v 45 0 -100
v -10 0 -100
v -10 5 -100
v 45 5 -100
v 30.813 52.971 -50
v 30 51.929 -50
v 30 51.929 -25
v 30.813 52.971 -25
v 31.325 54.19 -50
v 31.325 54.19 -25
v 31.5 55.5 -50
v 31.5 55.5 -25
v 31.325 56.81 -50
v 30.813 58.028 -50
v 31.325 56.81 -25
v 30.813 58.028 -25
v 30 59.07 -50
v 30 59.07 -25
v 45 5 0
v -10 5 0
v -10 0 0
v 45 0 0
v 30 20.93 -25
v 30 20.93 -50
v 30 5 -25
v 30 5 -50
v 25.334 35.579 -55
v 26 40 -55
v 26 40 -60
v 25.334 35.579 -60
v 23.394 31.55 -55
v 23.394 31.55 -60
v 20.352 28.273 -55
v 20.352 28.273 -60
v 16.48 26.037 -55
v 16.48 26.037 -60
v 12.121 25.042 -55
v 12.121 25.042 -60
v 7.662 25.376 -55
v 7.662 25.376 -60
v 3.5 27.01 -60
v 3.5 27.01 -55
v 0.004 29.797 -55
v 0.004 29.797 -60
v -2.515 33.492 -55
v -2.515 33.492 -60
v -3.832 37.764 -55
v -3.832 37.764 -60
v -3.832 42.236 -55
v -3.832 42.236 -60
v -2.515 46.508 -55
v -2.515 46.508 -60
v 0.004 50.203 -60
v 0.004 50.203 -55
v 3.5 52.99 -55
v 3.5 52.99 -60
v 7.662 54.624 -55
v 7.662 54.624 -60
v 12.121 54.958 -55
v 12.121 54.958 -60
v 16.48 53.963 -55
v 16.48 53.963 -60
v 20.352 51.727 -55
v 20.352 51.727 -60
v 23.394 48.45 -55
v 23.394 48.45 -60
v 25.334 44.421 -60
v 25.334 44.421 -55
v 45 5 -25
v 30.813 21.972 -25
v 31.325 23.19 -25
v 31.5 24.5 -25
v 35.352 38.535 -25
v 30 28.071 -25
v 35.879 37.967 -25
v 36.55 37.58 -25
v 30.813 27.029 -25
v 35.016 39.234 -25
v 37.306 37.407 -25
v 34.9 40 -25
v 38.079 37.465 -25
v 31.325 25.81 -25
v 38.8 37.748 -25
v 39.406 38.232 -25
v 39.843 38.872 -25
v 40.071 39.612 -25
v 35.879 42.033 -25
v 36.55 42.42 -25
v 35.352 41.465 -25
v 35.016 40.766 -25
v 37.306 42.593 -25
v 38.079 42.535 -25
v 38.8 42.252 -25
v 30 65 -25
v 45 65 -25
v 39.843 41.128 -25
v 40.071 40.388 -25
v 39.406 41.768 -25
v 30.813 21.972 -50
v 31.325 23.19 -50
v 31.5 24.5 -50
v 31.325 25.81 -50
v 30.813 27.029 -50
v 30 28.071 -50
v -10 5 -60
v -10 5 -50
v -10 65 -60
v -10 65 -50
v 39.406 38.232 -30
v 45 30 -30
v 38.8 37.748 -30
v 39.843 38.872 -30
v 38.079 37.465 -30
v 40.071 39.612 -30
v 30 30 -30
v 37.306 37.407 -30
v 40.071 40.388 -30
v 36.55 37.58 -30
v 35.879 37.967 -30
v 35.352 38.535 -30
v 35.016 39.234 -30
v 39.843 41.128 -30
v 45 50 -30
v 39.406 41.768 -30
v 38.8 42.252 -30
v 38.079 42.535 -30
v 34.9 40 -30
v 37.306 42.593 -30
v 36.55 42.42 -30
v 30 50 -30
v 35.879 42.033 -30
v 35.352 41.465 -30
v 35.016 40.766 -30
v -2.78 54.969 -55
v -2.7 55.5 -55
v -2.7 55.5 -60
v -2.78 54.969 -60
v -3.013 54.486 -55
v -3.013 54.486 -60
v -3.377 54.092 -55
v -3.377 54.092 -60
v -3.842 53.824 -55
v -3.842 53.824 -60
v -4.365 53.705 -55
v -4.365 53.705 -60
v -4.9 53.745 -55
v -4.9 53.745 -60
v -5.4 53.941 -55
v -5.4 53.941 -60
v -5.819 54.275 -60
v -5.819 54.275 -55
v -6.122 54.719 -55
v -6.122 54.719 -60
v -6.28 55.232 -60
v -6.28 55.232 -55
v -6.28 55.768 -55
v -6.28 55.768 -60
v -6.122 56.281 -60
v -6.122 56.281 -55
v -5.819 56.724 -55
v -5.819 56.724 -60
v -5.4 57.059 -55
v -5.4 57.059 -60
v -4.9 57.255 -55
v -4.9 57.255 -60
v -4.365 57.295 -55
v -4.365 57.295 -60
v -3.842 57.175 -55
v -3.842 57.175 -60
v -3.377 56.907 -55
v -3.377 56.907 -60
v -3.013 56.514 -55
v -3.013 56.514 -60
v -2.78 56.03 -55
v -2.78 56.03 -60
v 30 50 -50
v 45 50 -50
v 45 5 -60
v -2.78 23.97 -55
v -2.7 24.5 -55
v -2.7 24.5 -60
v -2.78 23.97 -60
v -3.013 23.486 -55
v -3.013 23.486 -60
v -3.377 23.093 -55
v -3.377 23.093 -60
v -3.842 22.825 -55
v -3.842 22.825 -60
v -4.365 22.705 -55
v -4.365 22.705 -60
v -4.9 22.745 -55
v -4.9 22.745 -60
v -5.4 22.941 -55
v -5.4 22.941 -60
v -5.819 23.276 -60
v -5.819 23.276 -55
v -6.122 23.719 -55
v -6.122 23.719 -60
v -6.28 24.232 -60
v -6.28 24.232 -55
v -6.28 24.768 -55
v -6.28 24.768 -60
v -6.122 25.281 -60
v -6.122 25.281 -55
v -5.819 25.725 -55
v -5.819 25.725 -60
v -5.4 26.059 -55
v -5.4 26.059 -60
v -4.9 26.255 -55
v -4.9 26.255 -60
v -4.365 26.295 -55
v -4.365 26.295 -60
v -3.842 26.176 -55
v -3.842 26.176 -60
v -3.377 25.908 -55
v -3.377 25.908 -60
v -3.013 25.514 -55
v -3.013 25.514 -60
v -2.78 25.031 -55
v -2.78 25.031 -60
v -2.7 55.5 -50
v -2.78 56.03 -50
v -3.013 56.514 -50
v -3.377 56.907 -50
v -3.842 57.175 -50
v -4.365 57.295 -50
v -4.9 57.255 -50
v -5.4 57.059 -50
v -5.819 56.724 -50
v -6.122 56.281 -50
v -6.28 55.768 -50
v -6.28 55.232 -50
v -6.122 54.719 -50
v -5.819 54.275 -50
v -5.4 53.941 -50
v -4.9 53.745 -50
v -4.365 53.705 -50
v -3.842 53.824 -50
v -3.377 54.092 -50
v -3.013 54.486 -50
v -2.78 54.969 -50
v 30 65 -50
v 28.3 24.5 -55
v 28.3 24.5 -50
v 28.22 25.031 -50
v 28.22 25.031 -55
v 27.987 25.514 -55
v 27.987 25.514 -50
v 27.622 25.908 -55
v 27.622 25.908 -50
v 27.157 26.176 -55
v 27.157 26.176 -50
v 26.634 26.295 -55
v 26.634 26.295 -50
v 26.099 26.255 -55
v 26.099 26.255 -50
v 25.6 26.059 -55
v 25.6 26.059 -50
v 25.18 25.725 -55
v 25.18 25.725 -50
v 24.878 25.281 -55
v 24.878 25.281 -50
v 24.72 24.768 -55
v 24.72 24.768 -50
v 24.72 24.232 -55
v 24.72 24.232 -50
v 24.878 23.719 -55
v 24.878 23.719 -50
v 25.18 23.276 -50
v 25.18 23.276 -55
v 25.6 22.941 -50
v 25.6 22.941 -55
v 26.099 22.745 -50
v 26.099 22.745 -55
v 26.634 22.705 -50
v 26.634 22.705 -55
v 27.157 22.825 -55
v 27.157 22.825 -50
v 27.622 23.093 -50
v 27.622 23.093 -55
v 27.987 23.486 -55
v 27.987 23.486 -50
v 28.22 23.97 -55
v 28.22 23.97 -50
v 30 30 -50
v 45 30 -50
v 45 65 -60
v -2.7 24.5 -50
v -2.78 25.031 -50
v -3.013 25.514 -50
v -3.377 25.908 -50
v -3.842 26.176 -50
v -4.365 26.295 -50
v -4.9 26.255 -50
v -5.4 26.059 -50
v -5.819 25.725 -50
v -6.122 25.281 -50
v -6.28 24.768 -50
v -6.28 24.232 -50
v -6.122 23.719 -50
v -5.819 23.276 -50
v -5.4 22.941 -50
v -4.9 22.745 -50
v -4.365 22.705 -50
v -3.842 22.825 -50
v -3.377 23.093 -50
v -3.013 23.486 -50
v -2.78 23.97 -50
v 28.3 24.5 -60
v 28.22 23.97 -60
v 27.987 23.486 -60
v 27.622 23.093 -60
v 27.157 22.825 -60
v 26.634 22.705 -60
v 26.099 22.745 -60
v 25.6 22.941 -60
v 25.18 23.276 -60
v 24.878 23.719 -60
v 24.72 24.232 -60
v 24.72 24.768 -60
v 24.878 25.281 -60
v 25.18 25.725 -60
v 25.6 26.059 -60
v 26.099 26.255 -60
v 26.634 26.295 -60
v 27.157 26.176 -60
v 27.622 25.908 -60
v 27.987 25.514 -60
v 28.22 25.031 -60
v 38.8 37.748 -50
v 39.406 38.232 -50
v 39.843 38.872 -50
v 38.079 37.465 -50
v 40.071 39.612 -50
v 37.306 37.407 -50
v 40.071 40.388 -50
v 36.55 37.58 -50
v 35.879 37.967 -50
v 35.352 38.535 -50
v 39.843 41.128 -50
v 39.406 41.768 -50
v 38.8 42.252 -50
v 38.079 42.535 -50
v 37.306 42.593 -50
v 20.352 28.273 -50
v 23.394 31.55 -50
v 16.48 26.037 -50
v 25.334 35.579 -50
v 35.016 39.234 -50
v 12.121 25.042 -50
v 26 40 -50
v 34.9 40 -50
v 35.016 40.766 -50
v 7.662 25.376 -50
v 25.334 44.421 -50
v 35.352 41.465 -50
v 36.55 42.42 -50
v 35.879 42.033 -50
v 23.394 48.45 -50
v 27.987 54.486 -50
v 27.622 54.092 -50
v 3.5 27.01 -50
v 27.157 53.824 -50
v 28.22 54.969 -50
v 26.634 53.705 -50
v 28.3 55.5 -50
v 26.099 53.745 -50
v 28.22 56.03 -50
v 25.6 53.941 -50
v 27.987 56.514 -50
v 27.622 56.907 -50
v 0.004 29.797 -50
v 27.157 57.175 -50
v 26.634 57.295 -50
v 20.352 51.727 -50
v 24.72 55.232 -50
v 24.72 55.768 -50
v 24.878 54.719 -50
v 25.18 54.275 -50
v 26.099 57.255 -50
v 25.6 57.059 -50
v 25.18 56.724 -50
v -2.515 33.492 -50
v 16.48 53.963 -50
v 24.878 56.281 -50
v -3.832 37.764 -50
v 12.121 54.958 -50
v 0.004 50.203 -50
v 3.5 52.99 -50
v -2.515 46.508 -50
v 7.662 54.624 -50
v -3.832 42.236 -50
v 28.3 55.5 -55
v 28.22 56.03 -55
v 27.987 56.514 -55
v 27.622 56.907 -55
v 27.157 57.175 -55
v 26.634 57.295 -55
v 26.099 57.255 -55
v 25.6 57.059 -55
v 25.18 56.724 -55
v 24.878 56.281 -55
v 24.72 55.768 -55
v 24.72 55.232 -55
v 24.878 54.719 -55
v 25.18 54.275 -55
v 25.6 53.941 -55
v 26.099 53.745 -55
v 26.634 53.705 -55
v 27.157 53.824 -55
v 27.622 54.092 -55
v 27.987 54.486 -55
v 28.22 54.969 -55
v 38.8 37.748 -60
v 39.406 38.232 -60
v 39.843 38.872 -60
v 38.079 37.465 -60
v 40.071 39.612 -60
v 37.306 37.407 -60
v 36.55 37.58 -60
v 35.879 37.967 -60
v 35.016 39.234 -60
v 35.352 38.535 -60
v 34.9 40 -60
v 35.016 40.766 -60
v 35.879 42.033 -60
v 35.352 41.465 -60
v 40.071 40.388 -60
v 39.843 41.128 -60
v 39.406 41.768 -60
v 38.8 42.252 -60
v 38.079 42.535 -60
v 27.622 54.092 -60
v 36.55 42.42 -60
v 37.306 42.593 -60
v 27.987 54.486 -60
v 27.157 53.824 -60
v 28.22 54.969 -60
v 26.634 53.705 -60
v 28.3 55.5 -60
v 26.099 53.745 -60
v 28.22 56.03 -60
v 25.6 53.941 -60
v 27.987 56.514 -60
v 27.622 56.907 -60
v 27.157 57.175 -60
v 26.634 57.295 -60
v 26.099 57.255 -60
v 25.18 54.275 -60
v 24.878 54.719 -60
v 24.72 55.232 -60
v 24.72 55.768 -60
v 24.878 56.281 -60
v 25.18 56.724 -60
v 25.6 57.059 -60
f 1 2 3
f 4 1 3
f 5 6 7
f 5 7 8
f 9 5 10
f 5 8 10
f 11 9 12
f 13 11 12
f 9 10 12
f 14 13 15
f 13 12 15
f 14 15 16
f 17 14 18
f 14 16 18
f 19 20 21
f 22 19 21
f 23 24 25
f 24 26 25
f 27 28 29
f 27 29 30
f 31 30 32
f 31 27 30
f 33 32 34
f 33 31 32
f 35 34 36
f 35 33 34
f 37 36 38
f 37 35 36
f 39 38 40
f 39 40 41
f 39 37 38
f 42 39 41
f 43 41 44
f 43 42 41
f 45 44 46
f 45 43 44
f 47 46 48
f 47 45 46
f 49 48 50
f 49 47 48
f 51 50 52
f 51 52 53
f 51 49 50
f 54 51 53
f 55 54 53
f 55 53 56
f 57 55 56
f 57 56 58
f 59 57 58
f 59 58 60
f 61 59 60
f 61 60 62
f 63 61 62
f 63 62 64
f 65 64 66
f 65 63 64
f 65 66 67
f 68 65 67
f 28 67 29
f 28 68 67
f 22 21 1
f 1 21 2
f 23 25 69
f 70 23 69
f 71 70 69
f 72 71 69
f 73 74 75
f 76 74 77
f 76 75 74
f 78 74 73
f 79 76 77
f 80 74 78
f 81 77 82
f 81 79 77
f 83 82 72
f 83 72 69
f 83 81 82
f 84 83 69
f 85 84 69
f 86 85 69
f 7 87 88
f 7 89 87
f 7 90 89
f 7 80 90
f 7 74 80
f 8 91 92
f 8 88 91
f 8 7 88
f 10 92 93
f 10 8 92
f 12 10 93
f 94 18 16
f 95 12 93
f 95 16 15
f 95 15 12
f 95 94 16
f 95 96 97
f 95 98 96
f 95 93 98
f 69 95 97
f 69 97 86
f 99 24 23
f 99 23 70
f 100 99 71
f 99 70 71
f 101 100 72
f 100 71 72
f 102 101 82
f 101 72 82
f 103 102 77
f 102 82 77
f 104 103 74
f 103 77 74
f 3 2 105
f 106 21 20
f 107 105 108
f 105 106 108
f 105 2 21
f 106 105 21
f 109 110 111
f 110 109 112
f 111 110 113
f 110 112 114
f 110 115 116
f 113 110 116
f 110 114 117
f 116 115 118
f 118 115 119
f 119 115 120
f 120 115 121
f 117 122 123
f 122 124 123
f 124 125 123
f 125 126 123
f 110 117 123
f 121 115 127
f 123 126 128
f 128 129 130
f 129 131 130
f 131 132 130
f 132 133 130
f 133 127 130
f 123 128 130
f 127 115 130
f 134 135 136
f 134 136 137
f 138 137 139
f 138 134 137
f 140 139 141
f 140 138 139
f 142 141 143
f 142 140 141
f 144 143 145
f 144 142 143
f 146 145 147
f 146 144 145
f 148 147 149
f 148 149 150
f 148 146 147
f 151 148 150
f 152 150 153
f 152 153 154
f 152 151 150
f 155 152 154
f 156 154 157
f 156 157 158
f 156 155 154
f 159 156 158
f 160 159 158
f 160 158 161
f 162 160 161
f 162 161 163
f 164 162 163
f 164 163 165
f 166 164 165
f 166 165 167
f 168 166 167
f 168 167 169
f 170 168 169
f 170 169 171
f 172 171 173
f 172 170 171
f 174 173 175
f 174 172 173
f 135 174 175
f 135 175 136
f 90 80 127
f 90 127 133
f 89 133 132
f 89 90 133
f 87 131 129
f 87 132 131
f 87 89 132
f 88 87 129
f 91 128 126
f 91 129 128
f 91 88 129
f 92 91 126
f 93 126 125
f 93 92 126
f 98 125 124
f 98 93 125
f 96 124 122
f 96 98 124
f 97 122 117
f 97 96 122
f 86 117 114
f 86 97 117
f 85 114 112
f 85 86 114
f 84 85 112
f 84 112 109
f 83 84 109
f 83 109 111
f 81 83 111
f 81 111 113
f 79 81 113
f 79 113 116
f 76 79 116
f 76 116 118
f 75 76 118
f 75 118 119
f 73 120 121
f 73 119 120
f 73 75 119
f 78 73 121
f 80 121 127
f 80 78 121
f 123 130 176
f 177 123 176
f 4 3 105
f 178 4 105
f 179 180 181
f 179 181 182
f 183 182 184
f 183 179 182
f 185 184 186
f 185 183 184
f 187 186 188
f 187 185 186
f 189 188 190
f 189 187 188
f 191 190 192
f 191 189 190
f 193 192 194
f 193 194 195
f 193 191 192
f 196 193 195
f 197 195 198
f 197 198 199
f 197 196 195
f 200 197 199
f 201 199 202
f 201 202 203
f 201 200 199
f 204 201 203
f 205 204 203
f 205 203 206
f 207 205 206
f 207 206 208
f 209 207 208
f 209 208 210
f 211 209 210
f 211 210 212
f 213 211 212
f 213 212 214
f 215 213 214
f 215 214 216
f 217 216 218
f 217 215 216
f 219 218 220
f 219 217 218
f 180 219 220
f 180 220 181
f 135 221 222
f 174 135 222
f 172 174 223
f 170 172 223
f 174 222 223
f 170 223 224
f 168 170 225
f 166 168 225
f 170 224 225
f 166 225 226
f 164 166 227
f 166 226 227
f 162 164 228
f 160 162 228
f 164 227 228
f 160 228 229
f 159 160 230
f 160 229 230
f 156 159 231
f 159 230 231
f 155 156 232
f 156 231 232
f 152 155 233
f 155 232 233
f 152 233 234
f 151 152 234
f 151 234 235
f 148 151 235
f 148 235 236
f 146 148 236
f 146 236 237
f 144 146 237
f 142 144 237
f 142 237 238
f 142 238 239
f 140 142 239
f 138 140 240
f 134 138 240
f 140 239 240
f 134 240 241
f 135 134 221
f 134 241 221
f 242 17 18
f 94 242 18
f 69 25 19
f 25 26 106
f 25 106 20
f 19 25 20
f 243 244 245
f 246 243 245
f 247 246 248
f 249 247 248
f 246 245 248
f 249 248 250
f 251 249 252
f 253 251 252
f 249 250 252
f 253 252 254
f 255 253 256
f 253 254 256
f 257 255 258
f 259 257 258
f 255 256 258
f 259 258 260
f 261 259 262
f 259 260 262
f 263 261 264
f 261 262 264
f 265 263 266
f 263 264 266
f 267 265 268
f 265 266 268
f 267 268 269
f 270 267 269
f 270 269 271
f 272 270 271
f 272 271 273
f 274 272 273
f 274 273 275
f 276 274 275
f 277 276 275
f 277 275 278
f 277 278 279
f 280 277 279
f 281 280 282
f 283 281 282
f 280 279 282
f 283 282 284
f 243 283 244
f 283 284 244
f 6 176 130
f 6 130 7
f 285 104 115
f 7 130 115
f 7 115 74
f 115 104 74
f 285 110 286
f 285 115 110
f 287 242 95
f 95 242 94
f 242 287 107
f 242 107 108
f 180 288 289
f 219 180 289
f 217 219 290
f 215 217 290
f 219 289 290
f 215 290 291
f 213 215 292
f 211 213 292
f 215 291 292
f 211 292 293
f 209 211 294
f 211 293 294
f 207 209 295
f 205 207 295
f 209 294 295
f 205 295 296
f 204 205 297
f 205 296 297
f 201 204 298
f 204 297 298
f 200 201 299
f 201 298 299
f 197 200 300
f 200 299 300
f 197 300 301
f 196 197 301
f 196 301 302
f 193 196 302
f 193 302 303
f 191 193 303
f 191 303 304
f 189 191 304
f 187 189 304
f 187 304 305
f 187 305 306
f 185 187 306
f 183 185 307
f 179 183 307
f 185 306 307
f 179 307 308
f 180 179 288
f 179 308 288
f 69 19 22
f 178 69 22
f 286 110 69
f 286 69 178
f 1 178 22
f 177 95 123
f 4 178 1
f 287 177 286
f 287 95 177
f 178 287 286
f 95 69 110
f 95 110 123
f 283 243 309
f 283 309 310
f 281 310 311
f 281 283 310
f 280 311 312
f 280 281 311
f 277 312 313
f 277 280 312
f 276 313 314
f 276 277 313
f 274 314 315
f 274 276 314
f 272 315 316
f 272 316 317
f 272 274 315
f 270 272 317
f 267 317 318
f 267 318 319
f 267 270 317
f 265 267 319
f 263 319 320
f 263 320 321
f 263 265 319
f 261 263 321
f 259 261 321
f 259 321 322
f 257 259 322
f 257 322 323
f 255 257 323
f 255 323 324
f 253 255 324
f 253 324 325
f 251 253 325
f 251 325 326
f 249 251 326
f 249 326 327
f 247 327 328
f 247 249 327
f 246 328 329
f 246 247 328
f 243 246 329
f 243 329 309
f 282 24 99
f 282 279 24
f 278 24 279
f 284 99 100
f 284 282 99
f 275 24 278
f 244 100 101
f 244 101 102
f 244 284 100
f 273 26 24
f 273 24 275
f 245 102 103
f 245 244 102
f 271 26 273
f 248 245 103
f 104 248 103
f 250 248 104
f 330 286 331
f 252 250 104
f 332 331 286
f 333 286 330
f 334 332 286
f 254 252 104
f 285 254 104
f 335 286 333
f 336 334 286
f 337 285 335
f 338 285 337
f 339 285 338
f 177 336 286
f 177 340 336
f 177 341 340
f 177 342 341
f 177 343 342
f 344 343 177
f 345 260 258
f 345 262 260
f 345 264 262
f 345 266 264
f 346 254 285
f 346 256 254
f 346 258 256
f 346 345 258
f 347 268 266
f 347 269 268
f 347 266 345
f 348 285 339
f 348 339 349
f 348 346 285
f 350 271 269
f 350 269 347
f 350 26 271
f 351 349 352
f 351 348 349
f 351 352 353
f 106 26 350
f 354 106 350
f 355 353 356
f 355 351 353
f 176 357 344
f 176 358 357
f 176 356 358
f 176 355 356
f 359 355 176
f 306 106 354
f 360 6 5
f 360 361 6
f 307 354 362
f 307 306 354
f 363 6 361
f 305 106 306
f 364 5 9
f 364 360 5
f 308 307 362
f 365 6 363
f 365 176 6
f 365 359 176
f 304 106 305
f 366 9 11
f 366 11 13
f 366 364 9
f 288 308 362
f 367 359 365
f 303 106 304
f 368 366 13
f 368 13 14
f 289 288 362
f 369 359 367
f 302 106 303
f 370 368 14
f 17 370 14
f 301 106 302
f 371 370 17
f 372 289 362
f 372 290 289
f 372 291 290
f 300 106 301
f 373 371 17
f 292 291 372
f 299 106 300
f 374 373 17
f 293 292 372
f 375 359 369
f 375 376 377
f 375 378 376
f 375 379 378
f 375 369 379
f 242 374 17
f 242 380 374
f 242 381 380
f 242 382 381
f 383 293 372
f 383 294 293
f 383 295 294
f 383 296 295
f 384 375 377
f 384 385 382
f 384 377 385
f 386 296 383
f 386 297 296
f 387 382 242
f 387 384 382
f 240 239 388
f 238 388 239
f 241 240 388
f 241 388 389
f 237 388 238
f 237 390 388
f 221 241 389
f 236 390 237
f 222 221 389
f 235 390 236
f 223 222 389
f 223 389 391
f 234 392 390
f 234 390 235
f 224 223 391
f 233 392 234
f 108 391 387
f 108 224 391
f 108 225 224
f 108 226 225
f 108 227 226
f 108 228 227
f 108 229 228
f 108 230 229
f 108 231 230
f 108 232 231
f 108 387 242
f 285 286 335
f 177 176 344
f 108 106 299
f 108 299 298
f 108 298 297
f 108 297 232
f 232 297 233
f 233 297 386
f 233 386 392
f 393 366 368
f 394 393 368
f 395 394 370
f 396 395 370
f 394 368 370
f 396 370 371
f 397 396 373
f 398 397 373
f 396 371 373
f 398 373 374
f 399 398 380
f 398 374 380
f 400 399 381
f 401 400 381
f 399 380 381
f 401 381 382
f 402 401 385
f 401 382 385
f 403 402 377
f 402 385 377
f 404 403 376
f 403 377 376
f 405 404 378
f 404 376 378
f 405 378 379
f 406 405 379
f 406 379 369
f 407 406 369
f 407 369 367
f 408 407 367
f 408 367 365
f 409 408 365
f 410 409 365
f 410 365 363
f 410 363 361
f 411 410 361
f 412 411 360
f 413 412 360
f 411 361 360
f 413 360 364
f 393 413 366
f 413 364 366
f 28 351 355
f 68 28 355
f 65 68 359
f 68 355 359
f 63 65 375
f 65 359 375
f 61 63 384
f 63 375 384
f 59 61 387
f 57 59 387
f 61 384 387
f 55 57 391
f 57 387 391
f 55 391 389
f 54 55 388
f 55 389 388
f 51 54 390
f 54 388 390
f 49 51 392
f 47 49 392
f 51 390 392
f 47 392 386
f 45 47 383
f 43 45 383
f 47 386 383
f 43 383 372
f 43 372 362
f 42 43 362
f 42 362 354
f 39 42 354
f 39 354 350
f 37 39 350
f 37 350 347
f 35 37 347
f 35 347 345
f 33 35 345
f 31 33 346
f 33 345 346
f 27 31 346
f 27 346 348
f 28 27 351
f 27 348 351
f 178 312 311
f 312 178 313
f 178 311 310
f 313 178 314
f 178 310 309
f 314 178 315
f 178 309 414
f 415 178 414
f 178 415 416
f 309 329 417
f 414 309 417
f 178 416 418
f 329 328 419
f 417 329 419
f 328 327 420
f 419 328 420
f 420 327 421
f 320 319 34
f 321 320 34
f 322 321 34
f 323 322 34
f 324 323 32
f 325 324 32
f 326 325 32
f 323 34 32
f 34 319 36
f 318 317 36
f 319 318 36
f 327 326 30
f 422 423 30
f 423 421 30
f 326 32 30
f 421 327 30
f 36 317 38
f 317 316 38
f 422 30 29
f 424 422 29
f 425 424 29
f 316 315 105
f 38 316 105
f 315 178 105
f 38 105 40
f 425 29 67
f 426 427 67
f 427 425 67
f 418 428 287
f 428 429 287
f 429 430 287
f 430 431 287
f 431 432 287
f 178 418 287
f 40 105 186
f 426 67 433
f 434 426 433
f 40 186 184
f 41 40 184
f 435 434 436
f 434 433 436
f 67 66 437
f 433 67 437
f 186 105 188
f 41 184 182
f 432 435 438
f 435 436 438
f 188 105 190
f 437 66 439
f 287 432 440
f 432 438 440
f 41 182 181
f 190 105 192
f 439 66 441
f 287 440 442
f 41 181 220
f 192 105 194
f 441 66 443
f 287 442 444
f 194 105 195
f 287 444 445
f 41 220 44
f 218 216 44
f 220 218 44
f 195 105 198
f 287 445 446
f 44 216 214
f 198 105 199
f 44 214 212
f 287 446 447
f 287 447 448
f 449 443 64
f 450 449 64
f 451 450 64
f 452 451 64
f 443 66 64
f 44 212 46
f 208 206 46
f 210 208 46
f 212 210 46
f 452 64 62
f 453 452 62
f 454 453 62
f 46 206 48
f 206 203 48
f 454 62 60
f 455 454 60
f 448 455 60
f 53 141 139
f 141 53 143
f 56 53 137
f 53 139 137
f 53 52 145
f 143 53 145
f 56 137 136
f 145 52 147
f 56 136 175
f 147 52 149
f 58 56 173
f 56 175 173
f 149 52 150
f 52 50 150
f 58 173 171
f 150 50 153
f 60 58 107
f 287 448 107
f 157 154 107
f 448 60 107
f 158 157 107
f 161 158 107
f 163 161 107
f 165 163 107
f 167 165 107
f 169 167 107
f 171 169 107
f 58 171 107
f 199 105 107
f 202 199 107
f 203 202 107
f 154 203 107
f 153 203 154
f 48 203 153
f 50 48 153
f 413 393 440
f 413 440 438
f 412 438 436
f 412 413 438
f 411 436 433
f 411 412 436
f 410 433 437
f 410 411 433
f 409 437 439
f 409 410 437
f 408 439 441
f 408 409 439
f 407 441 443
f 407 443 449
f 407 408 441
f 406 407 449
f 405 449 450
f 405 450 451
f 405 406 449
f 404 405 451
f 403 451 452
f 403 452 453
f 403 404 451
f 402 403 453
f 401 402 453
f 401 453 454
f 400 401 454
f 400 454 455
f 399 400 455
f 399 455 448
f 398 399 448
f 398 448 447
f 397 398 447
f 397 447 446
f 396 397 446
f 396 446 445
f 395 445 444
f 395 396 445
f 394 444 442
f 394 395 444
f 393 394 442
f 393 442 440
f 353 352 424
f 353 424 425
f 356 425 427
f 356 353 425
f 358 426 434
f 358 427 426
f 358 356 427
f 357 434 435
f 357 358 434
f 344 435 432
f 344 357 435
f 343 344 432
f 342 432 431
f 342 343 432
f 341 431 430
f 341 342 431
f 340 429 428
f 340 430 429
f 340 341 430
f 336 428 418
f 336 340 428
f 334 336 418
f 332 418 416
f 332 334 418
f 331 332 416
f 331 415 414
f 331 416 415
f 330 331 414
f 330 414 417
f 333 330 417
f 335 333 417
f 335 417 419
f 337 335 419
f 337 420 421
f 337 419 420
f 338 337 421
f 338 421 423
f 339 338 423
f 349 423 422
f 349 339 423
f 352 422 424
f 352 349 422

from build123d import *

# Parameters (mm, degrees)
SKETCH4_W               = 40
SKETCH4_H               = 80
BOSS_EXTRUDE4_DEPTH     = 5
SKETCH5_W               = 10
SKETCH5_H               = 5
BOSS_EXTRUDE6_DEPTH     = 50
SKETCH7_W               = 10
SKETCH7_H               = 25
SKETCH7_H_2             = 5
BOSS_EXTRUDE7_DEPTH     = 20
SKETCH8_W               = 40
SKETCH8_H               = 5
BOSS_EXTRUDE8_DEPTH     = 20
SKETCH9_W               = 100
SKETCH9_H               = 5
BOSS_EXTRUDE9_DEPTH     = 10
SKETCH10_W              = 5
SKETCH10_H              = 50
BOSS_EXTRUDE10_DEPTH    = 40
BOSS_EXTRUDE11_DEPTH    = 10
SKETCH12_R              = 15
SKETCH12_R_2            = 1.8
CUT_EXTRUDE1_DEPTH      = 5
CUT_EXTRUDE2_DEPTH      = 92.241437954
CUT_EXTRUDE2_DEPTH_BACK = 92.241437954
SKETCH13_R              = 2.25
SKETCH14_R              = 4
SKETCH14_R_2            = 2.25
CUT_EXTRUDE4_DEPTH      = 2
CUT_EXTRUDE5_START      = -2
SKETCH15_R              = 4
SKETCH15_R_2            = 2.25
CUT_EXTRUDE5_DEPTH      = 2
SKETCH17_R              = 5
CUT_EXTRUDE6_DEPTH      = 25
SKETCH19_W              = 50
SKETCH19_H              = 60
SKETCH19_R              = 1.8
SKETCH19_R_2            = 15
SKETCH19_R_3            = 4
BOSS_EXTRUDE13_DEPTH    = 5
SKETCH20_R              = 4
SKETCH20_R_2            = 2.25
BOSS_EXTRUDE14_DEPTH    = 5
SKETCH21_W              = 20
SKETCH21_H              = 20
BOSS_EXTRUDE15_DEPTH    = 5
BOSS_EXTRUDE16_START    = -10
SKETCH22_R              = 4
BOSS_EXTRUDE16_DEPTH    = 10
SKETCH23_R              = 4
BOSS_EXTRUDE17_DEPTH    = 5
CUT_EXTRUDE7_DEPTH      = 106.59356041
CUT_EXTRUDE7_DEPTH_BACK = 106.59356041
SKETCH24_R              = 2.6


with BuildPart() as part:
    # Sketch4 → Boss-Extrude4 (new body)
    with BuildSketch(Plane(origin=(0, 0, 0), x_dir=(1, 0, 0), z_dir=(0, 1, 0))):
        with Locations((20, 40)):
            Rectangle(SKETCH4_W, SKETCH4_H)
    extrude(amount=BOSS_EXTRUDE4_DEPTH)

    # Sketch5 → Boss-Extrude6 (add)
    with BuildSketch(Plane(origin=(0, 5, 0), x_dir=(1, 0, 0), z_dir=(0, 1, 0))):
        with Locations((35, 52.5)):
            Rectangle(SKETCH5_W, SKETCH5_H)
        with Locations((35, 27.5)):
            Rectangle(SKETCH5_W, SKETCH5_H)
    extrude(amount=BOSS_EXTRUDE6_DEPTH)

    # Sketch7 → Boss-Extrude7 (add)
    with BuildSketch(Plane.XY.offset(-50)):
        with Locations((35, 17.5)):
            Rectangle(SKETCH7_W, SKETCH7_H)
        with Locations((35, 52.5)):
            Rectangle(SKETCH7_W, SKETCH7_H_2)
    extrude(amount=BOSS_EXTRUDE7_DEPTH)

    # Sketch8 → Boss-Extrude8 (add)
    with BuildSketch(Plane(origin=(0, 0, -80), x_dir=(-1, 0, 0), z_dir=(0, 0, -1))):
        with Locations((-20, 2.5)):
            Rectangle(SKETCH8_W, SKETCH8_H)
    extrude(amount=BOSS_EXTRUDE8_DEPTH)

    # Sketch9 → Boss-Extrude9 (add)
    with BuildSketch(Plane.ZY):
        with Locations((-50, 2.5)):
            Rectangle(SKETCH9_W, SKETCH9_H)
    extrude(amount=BOSS_EXTRUDE9_DEPTH)

    # Sketch10 → Boss-Extrude10 (add)
    with BuildSketch(Plane.ZY.offset(-30)):
        with Locations((-52.5, 30)):
            Rectangle(SKETCH10_W, SKETCH10_H)
    extrude(amount=BOSS_EXTRUDE10_DEPTH)

    # Sketch11 → Boss-Extrude11 (add)
    with BuildSketch(Plane(origin=(0, 55, 0), x_dir=(1, 0, 0), z_dir=(0, 1, 0))):
        Polygon((40, 55), (-10, 55), (-10, 50), (30, 50), (30, 25), (40, 25), align=None)
    extrude(amount=BOSS_EXTRUDE11_DEPTH)

    # Sketch12 → Cut-Extrude1 (cut)
    with BuildSketch(Plane.XY.offset(-50)):
        with Locations((11, 40)):
            Circle(SKETCH12_R)
        with Locations((-4.499780644, 55.499780644)):
            Circle(SKETCH12_R_2)
        with Locations((26.499780644, 55.499780644)):
            Circle(SKETCH12_R_2)
        with Locations((-4.499780644, 24.500219356)):
            Circle(SKETCH12_R_2)
        with Locations((26.499780644, 24.500219356)):
            Circle(SKETCH12_R_2)
    extrude(amount=-CUT_EXTRUDE1_DEPTH, mode=Mode.SUBTRACT)

    # Sketch13 → Cut-Extrude2 (cut, two sides: drawn at the far end of the back side and taken through both)
    with BuildSketch(Plane.XY.offset(-50).offset(-CUT_EXTRUDE2_DEPTH_BACK)):
        with Locations((35, 40)):
            Circle(SKETCH13_R)
    extrude(amount=CUT_EXTRUDE2_DEPTH + CUT_EXTRUDE2_DEPTH_BACK, mode=Mode.SUBTRACT)

    # Sketch14 → Cut-Extrude4 (cut)
    with BuildSketch(Plane.XY.offset(-25)):
        with Locations((35, 40)):
            Circle(SKETCH14_R)
        with Locations((35, 40)):
            Circle(SKETCH14_R_2, mode=Mode.SUBTRACT)
    extrude(amount=-CUT_EXTRUDE4_DEPTH, mode=Mode.SUBTRACT)

    # Sketch15 → Cut-Extrude5 (cut)
    with BuildSketch(Plane(origin=(0, 0, -55), x_dir=(-1, 0, 0), z_dir=(0, 0, -1)).offset(CUT_EXTRUDE5_START)):
        with Locations(Location((-35, 40, 0), (0, 0, 180))):
            Circle(SKETCH15_R)
        with Locations(Location((-35, 40, 0), (0, 0, 180))):
            Circle(SKETCH15_R_2, mode=Mode.SUBTRACT)
    extrude(amount=CUT_EXTRUDE5_DEPTH, mode=Mode.SUBTRACT)

    # Sketch17 → Cut-Extrude6 (cut)
    with BuildSketch(Plane.XY.offset(-25)):
        with Locations((26.499780644, 55.499780644)):
            Circle(SKETCH17_R)
        with Locations((26.499780644, 24.500219356)):
            Circle(SKETCH17_R)
    extrude(amount=-CUT_EXTRUDE6_DEPTH, mode=Mode.SUBTRACT)

    # Sketch19 → Boss-Extrude13 (add)
    with BuildSketch(Plane(origin=(0, 0, -55), x_dir=(-1, 0, 0), z_dir=(0, 0, -1))):
        with Locations((-15, 35)):
            Rectangle(SKETCH19_W, SKETCH19_H)
        with Locations(Location((4.499780644, 55.499780644, 0), (0, 0, 180))):
            Circle(SKETCH19_R, mode=Mode.SUBTRACT)
        with Locations(Location((4.499780644, 24.500219356, 0), (0, 0, 180))):
            Circle(SKETCH19_R, mode=Mode.SUBTRACT)
        with Locations(Location((-26.499780644, 24.500219356, 0), (0, 0, 180))):
            Circle(SKETCH19_R, mode=Mode.SUBTRACT)
        with Locations(Location((-11, 40, 0), (0, 0, 180))):
            Circle(SKETCH19_R_2, mode=Mode.SUBTRACT)
        with Locations(Location((-35, 40, 0), (0, 0, 180))):
            Circle(SKETCH19_R_3, mode=Mode.SUBTRACT)
        with Locations(Location((-26.499780644, 55.499780644, 0), (0, 0, 180))):
            Circle(SKETCH19_R, mode=Mode.SUBTRACT)
    extrude(amount=BOSS_EXTRUDE13_DEPTH)

    # Sketch20 → Boss-Extrude14 (add)
    with BuildSketch(Plane(origin=(0, 0, -53), x_dir=(-1, 0, 0), z_dir=(0, 0, -1))):
        with Locations(Location((-35, 40, 0), (0, 0, 180))):
            Circle(SKETCH20_R)
        with Locations(Location((-35, 40, 0), (0, 0, 180))):
            Circle(SKETCH20_R_2, mode=Mode.SUBTRACT)
    extrude(amount=BOSS_EXTRUDE14_DEPTH)

    # Sketch21 → Boss-Extrude15 (add)
    with BuildSketch(Plane(origin=(40, 0, 0), x_dir=(0, 0, -1), z_dir=(1, 0, 0))):
        Polygon((100, 5), (60, 5), (60, 65), (25, 65), (25, 5), (0, 5), (0, 0), (100, 0), align=None)
        with Locations((40, 40)):
            Rectangle(SKETCH21_W, SKETCH21_H, mode=Mode.SUBTRACT)
    extrude(amount=BOSS_EXTRUDE15_DEPTH)

    # Sketch22 → Boss-Extrude16 (add)
    with BuildSketch(Plane(origin=(0, 0, -60), x_dir=(-1, 0, 0), z_dir=(0, 0, -1)).offset(BOSS_EXTRUDE16_START)):
        with Locations(Location((-35, 40, 0), (0, 0, 180))):
            Circle(SKETCH22_R)
    extrude(amount=BOSS_EXTRUDE16_DEPTH)

    # Sketch23 → Boss-Extrude17 (add)
    with BuildSketch(Plane.XY.offset(-25)):
        with Locations((35, 40)):
            Circle(SKETCH23_R)
    extrude(amount=-BOSS_EXTRUDE17_DEPTH)

    # Sketch24 → Cut-Extrude7 (cut, two sides: drawn at the far end of the back side and taken through both)
    with BuildSketch(Plane(origin=(0, 0, -30), x_dir=(-1, 0, 0), z_dir=(0, 0, -1)).offset(-CUT_EXTRUDE7_DEPTH_BACK)):
        with Locations((-37.5, 40)):
            Circle(SKETCH24_R)
    extrude(amount=CUT_EXTRUDE7_DEPTH + CUT_EXTRUDE7_DEPTH_BACK, mode=Mode.SUBTRACT)


solid = part.part
